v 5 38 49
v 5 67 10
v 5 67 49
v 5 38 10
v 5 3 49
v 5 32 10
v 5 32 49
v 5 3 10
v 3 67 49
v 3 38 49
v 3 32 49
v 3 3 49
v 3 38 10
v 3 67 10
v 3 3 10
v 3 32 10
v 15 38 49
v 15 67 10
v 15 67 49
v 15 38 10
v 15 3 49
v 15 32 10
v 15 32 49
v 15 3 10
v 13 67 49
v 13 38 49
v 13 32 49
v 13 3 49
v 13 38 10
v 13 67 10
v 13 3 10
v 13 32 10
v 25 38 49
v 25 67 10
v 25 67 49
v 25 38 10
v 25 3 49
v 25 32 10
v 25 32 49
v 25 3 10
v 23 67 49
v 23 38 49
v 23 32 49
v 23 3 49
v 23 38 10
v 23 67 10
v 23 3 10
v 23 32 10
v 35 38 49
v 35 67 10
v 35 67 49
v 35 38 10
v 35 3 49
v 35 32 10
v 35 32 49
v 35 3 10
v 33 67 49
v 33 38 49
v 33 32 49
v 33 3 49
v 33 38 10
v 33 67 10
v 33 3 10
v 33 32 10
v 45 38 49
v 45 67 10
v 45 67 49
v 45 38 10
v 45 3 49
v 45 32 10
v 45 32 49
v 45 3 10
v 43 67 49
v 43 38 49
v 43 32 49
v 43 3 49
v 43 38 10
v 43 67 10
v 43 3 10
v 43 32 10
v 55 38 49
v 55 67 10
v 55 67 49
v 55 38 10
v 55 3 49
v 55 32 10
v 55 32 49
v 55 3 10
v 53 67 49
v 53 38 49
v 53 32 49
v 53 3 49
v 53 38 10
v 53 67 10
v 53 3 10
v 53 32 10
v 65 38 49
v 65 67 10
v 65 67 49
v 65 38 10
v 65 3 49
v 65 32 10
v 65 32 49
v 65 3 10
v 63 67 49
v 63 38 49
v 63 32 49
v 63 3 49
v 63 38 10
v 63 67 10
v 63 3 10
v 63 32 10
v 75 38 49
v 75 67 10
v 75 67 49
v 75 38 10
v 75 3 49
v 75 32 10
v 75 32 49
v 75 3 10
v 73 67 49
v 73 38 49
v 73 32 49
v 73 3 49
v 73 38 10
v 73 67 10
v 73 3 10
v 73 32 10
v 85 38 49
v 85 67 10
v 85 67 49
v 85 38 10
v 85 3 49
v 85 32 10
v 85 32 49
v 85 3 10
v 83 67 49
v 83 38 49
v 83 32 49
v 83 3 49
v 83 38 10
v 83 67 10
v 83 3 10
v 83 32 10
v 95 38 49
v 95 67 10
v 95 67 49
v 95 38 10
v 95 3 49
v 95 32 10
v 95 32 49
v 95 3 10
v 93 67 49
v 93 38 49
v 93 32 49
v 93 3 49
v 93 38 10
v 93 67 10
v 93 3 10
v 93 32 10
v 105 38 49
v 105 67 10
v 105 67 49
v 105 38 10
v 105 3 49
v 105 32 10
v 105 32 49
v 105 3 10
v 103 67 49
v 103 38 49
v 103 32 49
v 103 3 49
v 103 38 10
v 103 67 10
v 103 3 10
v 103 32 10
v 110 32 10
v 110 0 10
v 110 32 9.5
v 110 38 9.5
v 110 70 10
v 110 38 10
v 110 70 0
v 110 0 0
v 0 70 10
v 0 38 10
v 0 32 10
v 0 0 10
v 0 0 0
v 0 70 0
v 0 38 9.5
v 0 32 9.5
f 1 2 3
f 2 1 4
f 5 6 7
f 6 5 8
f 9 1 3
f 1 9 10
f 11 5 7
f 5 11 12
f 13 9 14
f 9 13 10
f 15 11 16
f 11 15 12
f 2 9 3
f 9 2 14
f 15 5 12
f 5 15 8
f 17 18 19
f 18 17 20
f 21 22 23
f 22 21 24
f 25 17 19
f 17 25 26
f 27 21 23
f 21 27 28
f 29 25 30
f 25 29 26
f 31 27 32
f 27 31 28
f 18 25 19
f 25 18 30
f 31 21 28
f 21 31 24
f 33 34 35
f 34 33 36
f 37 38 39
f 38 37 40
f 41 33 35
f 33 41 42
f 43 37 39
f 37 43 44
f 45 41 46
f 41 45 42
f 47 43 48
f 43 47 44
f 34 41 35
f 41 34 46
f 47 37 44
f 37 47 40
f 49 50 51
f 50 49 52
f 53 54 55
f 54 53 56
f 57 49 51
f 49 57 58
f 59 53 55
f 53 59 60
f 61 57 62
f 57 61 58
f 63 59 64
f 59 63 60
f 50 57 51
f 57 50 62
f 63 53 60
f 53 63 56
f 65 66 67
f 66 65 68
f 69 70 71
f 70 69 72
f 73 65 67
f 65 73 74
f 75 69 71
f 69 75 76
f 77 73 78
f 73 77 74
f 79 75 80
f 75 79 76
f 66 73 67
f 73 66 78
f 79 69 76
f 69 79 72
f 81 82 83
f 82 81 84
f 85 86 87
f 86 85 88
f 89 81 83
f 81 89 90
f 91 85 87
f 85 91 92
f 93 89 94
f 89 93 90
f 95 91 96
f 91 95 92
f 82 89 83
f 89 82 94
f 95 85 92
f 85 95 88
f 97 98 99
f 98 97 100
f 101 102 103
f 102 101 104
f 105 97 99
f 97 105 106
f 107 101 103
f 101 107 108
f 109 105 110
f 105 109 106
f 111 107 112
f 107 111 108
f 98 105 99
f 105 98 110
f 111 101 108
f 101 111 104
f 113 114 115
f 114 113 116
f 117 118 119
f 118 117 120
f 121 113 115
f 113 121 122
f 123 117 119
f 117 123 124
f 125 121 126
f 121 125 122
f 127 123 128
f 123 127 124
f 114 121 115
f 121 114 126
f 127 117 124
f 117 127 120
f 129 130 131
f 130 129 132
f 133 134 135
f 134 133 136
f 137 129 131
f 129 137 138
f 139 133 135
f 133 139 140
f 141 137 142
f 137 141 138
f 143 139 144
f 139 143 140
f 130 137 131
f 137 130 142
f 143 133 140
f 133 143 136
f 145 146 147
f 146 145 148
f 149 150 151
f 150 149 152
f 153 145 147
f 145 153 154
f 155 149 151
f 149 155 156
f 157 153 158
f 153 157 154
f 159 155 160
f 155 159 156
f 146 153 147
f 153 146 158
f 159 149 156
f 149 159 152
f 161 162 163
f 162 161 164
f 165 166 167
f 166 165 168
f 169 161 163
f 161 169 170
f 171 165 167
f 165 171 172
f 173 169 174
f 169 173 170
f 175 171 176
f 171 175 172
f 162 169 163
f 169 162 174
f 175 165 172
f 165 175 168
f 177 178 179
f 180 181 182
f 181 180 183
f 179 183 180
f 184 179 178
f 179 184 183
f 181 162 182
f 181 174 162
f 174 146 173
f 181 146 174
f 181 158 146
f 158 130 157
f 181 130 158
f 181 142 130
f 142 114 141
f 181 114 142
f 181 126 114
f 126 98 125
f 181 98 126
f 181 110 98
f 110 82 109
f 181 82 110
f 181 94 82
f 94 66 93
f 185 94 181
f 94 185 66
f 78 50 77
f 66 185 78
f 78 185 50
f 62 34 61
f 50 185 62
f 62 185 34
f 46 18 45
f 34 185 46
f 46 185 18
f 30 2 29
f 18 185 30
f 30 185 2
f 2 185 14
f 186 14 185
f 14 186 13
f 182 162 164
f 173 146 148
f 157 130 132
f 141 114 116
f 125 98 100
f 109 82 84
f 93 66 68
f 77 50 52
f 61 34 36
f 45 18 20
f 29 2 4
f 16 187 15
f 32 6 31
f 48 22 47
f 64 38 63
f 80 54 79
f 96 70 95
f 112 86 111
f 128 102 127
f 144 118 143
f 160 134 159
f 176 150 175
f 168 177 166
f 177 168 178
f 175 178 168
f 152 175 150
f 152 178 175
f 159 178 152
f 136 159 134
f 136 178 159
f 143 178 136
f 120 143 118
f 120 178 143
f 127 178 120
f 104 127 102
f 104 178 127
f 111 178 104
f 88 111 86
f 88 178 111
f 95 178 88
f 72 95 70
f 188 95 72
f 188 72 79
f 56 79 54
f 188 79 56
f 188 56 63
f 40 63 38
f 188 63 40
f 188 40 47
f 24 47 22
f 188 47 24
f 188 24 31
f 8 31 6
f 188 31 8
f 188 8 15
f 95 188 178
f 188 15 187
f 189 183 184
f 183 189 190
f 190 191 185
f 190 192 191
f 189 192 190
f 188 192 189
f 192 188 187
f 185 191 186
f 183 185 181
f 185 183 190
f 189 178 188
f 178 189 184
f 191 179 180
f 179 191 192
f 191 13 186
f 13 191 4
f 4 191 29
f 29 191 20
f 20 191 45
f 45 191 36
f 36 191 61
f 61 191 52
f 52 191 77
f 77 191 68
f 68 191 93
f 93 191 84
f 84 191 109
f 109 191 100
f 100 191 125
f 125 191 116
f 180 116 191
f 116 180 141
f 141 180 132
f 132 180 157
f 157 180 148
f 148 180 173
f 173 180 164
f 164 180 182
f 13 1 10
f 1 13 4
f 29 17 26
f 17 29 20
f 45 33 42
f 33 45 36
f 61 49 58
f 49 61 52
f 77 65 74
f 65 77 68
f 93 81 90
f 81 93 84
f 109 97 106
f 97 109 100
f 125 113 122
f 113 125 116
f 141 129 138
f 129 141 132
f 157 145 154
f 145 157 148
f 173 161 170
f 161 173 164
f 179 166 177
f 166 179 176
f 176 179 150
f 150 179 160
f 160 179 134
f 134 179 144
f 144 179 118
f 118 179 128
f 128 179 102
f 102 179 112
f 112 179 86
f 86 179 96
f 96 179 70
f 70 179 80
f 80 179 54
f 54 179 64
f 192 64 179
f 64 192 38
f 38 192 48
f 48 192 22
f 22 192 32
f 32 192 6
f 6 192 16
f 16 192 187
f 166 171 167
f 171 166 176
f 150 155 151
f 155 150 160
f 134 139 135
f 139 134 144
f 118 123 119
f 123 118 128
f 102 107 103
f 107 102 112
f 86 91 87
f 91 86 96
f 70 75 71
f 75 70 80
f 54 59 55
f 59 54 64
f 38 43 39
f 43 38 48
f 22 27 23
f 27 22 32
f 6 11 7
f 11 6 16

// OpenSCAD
$fn = 32;

// ----------------------------------------------------------------------
// Heatsink: slotted fin block
// ----------------------------------------------------------------------

// --- parameters (mm) ---
base_l = 110;             // base length, X
base_w = 70;              // base width, Y
base_t = 10;              // base plate thickness
fin_h = 40;               // fin height above the base
fin_t = 2;                // fin thickness
edge = 3;                 // margin from the base ends
pitch = 10;               // fin pitch
slot_w = 6;               // central slot width, Y

n_fins = floor((base_l - 2 * edge - fin_t) / pitch) + 1;  // fin count
total_h = base_t + fin_h - 1;  // overall height

difference() {
union() {
  cube([base_l, base_w, base_t]);
  for (i = [0 : n_fins - 1])
    translate([edge + i * pitch, edge, base_t - 1])
      cube([fin_t, base_w - 2 * edge, fin_h]);
}
  translate([-1, base_w / 2 - slot_w / 2, base_t - 0.5])
    cube([base_l + 2, slot_w, fin_h + 2]);
}
